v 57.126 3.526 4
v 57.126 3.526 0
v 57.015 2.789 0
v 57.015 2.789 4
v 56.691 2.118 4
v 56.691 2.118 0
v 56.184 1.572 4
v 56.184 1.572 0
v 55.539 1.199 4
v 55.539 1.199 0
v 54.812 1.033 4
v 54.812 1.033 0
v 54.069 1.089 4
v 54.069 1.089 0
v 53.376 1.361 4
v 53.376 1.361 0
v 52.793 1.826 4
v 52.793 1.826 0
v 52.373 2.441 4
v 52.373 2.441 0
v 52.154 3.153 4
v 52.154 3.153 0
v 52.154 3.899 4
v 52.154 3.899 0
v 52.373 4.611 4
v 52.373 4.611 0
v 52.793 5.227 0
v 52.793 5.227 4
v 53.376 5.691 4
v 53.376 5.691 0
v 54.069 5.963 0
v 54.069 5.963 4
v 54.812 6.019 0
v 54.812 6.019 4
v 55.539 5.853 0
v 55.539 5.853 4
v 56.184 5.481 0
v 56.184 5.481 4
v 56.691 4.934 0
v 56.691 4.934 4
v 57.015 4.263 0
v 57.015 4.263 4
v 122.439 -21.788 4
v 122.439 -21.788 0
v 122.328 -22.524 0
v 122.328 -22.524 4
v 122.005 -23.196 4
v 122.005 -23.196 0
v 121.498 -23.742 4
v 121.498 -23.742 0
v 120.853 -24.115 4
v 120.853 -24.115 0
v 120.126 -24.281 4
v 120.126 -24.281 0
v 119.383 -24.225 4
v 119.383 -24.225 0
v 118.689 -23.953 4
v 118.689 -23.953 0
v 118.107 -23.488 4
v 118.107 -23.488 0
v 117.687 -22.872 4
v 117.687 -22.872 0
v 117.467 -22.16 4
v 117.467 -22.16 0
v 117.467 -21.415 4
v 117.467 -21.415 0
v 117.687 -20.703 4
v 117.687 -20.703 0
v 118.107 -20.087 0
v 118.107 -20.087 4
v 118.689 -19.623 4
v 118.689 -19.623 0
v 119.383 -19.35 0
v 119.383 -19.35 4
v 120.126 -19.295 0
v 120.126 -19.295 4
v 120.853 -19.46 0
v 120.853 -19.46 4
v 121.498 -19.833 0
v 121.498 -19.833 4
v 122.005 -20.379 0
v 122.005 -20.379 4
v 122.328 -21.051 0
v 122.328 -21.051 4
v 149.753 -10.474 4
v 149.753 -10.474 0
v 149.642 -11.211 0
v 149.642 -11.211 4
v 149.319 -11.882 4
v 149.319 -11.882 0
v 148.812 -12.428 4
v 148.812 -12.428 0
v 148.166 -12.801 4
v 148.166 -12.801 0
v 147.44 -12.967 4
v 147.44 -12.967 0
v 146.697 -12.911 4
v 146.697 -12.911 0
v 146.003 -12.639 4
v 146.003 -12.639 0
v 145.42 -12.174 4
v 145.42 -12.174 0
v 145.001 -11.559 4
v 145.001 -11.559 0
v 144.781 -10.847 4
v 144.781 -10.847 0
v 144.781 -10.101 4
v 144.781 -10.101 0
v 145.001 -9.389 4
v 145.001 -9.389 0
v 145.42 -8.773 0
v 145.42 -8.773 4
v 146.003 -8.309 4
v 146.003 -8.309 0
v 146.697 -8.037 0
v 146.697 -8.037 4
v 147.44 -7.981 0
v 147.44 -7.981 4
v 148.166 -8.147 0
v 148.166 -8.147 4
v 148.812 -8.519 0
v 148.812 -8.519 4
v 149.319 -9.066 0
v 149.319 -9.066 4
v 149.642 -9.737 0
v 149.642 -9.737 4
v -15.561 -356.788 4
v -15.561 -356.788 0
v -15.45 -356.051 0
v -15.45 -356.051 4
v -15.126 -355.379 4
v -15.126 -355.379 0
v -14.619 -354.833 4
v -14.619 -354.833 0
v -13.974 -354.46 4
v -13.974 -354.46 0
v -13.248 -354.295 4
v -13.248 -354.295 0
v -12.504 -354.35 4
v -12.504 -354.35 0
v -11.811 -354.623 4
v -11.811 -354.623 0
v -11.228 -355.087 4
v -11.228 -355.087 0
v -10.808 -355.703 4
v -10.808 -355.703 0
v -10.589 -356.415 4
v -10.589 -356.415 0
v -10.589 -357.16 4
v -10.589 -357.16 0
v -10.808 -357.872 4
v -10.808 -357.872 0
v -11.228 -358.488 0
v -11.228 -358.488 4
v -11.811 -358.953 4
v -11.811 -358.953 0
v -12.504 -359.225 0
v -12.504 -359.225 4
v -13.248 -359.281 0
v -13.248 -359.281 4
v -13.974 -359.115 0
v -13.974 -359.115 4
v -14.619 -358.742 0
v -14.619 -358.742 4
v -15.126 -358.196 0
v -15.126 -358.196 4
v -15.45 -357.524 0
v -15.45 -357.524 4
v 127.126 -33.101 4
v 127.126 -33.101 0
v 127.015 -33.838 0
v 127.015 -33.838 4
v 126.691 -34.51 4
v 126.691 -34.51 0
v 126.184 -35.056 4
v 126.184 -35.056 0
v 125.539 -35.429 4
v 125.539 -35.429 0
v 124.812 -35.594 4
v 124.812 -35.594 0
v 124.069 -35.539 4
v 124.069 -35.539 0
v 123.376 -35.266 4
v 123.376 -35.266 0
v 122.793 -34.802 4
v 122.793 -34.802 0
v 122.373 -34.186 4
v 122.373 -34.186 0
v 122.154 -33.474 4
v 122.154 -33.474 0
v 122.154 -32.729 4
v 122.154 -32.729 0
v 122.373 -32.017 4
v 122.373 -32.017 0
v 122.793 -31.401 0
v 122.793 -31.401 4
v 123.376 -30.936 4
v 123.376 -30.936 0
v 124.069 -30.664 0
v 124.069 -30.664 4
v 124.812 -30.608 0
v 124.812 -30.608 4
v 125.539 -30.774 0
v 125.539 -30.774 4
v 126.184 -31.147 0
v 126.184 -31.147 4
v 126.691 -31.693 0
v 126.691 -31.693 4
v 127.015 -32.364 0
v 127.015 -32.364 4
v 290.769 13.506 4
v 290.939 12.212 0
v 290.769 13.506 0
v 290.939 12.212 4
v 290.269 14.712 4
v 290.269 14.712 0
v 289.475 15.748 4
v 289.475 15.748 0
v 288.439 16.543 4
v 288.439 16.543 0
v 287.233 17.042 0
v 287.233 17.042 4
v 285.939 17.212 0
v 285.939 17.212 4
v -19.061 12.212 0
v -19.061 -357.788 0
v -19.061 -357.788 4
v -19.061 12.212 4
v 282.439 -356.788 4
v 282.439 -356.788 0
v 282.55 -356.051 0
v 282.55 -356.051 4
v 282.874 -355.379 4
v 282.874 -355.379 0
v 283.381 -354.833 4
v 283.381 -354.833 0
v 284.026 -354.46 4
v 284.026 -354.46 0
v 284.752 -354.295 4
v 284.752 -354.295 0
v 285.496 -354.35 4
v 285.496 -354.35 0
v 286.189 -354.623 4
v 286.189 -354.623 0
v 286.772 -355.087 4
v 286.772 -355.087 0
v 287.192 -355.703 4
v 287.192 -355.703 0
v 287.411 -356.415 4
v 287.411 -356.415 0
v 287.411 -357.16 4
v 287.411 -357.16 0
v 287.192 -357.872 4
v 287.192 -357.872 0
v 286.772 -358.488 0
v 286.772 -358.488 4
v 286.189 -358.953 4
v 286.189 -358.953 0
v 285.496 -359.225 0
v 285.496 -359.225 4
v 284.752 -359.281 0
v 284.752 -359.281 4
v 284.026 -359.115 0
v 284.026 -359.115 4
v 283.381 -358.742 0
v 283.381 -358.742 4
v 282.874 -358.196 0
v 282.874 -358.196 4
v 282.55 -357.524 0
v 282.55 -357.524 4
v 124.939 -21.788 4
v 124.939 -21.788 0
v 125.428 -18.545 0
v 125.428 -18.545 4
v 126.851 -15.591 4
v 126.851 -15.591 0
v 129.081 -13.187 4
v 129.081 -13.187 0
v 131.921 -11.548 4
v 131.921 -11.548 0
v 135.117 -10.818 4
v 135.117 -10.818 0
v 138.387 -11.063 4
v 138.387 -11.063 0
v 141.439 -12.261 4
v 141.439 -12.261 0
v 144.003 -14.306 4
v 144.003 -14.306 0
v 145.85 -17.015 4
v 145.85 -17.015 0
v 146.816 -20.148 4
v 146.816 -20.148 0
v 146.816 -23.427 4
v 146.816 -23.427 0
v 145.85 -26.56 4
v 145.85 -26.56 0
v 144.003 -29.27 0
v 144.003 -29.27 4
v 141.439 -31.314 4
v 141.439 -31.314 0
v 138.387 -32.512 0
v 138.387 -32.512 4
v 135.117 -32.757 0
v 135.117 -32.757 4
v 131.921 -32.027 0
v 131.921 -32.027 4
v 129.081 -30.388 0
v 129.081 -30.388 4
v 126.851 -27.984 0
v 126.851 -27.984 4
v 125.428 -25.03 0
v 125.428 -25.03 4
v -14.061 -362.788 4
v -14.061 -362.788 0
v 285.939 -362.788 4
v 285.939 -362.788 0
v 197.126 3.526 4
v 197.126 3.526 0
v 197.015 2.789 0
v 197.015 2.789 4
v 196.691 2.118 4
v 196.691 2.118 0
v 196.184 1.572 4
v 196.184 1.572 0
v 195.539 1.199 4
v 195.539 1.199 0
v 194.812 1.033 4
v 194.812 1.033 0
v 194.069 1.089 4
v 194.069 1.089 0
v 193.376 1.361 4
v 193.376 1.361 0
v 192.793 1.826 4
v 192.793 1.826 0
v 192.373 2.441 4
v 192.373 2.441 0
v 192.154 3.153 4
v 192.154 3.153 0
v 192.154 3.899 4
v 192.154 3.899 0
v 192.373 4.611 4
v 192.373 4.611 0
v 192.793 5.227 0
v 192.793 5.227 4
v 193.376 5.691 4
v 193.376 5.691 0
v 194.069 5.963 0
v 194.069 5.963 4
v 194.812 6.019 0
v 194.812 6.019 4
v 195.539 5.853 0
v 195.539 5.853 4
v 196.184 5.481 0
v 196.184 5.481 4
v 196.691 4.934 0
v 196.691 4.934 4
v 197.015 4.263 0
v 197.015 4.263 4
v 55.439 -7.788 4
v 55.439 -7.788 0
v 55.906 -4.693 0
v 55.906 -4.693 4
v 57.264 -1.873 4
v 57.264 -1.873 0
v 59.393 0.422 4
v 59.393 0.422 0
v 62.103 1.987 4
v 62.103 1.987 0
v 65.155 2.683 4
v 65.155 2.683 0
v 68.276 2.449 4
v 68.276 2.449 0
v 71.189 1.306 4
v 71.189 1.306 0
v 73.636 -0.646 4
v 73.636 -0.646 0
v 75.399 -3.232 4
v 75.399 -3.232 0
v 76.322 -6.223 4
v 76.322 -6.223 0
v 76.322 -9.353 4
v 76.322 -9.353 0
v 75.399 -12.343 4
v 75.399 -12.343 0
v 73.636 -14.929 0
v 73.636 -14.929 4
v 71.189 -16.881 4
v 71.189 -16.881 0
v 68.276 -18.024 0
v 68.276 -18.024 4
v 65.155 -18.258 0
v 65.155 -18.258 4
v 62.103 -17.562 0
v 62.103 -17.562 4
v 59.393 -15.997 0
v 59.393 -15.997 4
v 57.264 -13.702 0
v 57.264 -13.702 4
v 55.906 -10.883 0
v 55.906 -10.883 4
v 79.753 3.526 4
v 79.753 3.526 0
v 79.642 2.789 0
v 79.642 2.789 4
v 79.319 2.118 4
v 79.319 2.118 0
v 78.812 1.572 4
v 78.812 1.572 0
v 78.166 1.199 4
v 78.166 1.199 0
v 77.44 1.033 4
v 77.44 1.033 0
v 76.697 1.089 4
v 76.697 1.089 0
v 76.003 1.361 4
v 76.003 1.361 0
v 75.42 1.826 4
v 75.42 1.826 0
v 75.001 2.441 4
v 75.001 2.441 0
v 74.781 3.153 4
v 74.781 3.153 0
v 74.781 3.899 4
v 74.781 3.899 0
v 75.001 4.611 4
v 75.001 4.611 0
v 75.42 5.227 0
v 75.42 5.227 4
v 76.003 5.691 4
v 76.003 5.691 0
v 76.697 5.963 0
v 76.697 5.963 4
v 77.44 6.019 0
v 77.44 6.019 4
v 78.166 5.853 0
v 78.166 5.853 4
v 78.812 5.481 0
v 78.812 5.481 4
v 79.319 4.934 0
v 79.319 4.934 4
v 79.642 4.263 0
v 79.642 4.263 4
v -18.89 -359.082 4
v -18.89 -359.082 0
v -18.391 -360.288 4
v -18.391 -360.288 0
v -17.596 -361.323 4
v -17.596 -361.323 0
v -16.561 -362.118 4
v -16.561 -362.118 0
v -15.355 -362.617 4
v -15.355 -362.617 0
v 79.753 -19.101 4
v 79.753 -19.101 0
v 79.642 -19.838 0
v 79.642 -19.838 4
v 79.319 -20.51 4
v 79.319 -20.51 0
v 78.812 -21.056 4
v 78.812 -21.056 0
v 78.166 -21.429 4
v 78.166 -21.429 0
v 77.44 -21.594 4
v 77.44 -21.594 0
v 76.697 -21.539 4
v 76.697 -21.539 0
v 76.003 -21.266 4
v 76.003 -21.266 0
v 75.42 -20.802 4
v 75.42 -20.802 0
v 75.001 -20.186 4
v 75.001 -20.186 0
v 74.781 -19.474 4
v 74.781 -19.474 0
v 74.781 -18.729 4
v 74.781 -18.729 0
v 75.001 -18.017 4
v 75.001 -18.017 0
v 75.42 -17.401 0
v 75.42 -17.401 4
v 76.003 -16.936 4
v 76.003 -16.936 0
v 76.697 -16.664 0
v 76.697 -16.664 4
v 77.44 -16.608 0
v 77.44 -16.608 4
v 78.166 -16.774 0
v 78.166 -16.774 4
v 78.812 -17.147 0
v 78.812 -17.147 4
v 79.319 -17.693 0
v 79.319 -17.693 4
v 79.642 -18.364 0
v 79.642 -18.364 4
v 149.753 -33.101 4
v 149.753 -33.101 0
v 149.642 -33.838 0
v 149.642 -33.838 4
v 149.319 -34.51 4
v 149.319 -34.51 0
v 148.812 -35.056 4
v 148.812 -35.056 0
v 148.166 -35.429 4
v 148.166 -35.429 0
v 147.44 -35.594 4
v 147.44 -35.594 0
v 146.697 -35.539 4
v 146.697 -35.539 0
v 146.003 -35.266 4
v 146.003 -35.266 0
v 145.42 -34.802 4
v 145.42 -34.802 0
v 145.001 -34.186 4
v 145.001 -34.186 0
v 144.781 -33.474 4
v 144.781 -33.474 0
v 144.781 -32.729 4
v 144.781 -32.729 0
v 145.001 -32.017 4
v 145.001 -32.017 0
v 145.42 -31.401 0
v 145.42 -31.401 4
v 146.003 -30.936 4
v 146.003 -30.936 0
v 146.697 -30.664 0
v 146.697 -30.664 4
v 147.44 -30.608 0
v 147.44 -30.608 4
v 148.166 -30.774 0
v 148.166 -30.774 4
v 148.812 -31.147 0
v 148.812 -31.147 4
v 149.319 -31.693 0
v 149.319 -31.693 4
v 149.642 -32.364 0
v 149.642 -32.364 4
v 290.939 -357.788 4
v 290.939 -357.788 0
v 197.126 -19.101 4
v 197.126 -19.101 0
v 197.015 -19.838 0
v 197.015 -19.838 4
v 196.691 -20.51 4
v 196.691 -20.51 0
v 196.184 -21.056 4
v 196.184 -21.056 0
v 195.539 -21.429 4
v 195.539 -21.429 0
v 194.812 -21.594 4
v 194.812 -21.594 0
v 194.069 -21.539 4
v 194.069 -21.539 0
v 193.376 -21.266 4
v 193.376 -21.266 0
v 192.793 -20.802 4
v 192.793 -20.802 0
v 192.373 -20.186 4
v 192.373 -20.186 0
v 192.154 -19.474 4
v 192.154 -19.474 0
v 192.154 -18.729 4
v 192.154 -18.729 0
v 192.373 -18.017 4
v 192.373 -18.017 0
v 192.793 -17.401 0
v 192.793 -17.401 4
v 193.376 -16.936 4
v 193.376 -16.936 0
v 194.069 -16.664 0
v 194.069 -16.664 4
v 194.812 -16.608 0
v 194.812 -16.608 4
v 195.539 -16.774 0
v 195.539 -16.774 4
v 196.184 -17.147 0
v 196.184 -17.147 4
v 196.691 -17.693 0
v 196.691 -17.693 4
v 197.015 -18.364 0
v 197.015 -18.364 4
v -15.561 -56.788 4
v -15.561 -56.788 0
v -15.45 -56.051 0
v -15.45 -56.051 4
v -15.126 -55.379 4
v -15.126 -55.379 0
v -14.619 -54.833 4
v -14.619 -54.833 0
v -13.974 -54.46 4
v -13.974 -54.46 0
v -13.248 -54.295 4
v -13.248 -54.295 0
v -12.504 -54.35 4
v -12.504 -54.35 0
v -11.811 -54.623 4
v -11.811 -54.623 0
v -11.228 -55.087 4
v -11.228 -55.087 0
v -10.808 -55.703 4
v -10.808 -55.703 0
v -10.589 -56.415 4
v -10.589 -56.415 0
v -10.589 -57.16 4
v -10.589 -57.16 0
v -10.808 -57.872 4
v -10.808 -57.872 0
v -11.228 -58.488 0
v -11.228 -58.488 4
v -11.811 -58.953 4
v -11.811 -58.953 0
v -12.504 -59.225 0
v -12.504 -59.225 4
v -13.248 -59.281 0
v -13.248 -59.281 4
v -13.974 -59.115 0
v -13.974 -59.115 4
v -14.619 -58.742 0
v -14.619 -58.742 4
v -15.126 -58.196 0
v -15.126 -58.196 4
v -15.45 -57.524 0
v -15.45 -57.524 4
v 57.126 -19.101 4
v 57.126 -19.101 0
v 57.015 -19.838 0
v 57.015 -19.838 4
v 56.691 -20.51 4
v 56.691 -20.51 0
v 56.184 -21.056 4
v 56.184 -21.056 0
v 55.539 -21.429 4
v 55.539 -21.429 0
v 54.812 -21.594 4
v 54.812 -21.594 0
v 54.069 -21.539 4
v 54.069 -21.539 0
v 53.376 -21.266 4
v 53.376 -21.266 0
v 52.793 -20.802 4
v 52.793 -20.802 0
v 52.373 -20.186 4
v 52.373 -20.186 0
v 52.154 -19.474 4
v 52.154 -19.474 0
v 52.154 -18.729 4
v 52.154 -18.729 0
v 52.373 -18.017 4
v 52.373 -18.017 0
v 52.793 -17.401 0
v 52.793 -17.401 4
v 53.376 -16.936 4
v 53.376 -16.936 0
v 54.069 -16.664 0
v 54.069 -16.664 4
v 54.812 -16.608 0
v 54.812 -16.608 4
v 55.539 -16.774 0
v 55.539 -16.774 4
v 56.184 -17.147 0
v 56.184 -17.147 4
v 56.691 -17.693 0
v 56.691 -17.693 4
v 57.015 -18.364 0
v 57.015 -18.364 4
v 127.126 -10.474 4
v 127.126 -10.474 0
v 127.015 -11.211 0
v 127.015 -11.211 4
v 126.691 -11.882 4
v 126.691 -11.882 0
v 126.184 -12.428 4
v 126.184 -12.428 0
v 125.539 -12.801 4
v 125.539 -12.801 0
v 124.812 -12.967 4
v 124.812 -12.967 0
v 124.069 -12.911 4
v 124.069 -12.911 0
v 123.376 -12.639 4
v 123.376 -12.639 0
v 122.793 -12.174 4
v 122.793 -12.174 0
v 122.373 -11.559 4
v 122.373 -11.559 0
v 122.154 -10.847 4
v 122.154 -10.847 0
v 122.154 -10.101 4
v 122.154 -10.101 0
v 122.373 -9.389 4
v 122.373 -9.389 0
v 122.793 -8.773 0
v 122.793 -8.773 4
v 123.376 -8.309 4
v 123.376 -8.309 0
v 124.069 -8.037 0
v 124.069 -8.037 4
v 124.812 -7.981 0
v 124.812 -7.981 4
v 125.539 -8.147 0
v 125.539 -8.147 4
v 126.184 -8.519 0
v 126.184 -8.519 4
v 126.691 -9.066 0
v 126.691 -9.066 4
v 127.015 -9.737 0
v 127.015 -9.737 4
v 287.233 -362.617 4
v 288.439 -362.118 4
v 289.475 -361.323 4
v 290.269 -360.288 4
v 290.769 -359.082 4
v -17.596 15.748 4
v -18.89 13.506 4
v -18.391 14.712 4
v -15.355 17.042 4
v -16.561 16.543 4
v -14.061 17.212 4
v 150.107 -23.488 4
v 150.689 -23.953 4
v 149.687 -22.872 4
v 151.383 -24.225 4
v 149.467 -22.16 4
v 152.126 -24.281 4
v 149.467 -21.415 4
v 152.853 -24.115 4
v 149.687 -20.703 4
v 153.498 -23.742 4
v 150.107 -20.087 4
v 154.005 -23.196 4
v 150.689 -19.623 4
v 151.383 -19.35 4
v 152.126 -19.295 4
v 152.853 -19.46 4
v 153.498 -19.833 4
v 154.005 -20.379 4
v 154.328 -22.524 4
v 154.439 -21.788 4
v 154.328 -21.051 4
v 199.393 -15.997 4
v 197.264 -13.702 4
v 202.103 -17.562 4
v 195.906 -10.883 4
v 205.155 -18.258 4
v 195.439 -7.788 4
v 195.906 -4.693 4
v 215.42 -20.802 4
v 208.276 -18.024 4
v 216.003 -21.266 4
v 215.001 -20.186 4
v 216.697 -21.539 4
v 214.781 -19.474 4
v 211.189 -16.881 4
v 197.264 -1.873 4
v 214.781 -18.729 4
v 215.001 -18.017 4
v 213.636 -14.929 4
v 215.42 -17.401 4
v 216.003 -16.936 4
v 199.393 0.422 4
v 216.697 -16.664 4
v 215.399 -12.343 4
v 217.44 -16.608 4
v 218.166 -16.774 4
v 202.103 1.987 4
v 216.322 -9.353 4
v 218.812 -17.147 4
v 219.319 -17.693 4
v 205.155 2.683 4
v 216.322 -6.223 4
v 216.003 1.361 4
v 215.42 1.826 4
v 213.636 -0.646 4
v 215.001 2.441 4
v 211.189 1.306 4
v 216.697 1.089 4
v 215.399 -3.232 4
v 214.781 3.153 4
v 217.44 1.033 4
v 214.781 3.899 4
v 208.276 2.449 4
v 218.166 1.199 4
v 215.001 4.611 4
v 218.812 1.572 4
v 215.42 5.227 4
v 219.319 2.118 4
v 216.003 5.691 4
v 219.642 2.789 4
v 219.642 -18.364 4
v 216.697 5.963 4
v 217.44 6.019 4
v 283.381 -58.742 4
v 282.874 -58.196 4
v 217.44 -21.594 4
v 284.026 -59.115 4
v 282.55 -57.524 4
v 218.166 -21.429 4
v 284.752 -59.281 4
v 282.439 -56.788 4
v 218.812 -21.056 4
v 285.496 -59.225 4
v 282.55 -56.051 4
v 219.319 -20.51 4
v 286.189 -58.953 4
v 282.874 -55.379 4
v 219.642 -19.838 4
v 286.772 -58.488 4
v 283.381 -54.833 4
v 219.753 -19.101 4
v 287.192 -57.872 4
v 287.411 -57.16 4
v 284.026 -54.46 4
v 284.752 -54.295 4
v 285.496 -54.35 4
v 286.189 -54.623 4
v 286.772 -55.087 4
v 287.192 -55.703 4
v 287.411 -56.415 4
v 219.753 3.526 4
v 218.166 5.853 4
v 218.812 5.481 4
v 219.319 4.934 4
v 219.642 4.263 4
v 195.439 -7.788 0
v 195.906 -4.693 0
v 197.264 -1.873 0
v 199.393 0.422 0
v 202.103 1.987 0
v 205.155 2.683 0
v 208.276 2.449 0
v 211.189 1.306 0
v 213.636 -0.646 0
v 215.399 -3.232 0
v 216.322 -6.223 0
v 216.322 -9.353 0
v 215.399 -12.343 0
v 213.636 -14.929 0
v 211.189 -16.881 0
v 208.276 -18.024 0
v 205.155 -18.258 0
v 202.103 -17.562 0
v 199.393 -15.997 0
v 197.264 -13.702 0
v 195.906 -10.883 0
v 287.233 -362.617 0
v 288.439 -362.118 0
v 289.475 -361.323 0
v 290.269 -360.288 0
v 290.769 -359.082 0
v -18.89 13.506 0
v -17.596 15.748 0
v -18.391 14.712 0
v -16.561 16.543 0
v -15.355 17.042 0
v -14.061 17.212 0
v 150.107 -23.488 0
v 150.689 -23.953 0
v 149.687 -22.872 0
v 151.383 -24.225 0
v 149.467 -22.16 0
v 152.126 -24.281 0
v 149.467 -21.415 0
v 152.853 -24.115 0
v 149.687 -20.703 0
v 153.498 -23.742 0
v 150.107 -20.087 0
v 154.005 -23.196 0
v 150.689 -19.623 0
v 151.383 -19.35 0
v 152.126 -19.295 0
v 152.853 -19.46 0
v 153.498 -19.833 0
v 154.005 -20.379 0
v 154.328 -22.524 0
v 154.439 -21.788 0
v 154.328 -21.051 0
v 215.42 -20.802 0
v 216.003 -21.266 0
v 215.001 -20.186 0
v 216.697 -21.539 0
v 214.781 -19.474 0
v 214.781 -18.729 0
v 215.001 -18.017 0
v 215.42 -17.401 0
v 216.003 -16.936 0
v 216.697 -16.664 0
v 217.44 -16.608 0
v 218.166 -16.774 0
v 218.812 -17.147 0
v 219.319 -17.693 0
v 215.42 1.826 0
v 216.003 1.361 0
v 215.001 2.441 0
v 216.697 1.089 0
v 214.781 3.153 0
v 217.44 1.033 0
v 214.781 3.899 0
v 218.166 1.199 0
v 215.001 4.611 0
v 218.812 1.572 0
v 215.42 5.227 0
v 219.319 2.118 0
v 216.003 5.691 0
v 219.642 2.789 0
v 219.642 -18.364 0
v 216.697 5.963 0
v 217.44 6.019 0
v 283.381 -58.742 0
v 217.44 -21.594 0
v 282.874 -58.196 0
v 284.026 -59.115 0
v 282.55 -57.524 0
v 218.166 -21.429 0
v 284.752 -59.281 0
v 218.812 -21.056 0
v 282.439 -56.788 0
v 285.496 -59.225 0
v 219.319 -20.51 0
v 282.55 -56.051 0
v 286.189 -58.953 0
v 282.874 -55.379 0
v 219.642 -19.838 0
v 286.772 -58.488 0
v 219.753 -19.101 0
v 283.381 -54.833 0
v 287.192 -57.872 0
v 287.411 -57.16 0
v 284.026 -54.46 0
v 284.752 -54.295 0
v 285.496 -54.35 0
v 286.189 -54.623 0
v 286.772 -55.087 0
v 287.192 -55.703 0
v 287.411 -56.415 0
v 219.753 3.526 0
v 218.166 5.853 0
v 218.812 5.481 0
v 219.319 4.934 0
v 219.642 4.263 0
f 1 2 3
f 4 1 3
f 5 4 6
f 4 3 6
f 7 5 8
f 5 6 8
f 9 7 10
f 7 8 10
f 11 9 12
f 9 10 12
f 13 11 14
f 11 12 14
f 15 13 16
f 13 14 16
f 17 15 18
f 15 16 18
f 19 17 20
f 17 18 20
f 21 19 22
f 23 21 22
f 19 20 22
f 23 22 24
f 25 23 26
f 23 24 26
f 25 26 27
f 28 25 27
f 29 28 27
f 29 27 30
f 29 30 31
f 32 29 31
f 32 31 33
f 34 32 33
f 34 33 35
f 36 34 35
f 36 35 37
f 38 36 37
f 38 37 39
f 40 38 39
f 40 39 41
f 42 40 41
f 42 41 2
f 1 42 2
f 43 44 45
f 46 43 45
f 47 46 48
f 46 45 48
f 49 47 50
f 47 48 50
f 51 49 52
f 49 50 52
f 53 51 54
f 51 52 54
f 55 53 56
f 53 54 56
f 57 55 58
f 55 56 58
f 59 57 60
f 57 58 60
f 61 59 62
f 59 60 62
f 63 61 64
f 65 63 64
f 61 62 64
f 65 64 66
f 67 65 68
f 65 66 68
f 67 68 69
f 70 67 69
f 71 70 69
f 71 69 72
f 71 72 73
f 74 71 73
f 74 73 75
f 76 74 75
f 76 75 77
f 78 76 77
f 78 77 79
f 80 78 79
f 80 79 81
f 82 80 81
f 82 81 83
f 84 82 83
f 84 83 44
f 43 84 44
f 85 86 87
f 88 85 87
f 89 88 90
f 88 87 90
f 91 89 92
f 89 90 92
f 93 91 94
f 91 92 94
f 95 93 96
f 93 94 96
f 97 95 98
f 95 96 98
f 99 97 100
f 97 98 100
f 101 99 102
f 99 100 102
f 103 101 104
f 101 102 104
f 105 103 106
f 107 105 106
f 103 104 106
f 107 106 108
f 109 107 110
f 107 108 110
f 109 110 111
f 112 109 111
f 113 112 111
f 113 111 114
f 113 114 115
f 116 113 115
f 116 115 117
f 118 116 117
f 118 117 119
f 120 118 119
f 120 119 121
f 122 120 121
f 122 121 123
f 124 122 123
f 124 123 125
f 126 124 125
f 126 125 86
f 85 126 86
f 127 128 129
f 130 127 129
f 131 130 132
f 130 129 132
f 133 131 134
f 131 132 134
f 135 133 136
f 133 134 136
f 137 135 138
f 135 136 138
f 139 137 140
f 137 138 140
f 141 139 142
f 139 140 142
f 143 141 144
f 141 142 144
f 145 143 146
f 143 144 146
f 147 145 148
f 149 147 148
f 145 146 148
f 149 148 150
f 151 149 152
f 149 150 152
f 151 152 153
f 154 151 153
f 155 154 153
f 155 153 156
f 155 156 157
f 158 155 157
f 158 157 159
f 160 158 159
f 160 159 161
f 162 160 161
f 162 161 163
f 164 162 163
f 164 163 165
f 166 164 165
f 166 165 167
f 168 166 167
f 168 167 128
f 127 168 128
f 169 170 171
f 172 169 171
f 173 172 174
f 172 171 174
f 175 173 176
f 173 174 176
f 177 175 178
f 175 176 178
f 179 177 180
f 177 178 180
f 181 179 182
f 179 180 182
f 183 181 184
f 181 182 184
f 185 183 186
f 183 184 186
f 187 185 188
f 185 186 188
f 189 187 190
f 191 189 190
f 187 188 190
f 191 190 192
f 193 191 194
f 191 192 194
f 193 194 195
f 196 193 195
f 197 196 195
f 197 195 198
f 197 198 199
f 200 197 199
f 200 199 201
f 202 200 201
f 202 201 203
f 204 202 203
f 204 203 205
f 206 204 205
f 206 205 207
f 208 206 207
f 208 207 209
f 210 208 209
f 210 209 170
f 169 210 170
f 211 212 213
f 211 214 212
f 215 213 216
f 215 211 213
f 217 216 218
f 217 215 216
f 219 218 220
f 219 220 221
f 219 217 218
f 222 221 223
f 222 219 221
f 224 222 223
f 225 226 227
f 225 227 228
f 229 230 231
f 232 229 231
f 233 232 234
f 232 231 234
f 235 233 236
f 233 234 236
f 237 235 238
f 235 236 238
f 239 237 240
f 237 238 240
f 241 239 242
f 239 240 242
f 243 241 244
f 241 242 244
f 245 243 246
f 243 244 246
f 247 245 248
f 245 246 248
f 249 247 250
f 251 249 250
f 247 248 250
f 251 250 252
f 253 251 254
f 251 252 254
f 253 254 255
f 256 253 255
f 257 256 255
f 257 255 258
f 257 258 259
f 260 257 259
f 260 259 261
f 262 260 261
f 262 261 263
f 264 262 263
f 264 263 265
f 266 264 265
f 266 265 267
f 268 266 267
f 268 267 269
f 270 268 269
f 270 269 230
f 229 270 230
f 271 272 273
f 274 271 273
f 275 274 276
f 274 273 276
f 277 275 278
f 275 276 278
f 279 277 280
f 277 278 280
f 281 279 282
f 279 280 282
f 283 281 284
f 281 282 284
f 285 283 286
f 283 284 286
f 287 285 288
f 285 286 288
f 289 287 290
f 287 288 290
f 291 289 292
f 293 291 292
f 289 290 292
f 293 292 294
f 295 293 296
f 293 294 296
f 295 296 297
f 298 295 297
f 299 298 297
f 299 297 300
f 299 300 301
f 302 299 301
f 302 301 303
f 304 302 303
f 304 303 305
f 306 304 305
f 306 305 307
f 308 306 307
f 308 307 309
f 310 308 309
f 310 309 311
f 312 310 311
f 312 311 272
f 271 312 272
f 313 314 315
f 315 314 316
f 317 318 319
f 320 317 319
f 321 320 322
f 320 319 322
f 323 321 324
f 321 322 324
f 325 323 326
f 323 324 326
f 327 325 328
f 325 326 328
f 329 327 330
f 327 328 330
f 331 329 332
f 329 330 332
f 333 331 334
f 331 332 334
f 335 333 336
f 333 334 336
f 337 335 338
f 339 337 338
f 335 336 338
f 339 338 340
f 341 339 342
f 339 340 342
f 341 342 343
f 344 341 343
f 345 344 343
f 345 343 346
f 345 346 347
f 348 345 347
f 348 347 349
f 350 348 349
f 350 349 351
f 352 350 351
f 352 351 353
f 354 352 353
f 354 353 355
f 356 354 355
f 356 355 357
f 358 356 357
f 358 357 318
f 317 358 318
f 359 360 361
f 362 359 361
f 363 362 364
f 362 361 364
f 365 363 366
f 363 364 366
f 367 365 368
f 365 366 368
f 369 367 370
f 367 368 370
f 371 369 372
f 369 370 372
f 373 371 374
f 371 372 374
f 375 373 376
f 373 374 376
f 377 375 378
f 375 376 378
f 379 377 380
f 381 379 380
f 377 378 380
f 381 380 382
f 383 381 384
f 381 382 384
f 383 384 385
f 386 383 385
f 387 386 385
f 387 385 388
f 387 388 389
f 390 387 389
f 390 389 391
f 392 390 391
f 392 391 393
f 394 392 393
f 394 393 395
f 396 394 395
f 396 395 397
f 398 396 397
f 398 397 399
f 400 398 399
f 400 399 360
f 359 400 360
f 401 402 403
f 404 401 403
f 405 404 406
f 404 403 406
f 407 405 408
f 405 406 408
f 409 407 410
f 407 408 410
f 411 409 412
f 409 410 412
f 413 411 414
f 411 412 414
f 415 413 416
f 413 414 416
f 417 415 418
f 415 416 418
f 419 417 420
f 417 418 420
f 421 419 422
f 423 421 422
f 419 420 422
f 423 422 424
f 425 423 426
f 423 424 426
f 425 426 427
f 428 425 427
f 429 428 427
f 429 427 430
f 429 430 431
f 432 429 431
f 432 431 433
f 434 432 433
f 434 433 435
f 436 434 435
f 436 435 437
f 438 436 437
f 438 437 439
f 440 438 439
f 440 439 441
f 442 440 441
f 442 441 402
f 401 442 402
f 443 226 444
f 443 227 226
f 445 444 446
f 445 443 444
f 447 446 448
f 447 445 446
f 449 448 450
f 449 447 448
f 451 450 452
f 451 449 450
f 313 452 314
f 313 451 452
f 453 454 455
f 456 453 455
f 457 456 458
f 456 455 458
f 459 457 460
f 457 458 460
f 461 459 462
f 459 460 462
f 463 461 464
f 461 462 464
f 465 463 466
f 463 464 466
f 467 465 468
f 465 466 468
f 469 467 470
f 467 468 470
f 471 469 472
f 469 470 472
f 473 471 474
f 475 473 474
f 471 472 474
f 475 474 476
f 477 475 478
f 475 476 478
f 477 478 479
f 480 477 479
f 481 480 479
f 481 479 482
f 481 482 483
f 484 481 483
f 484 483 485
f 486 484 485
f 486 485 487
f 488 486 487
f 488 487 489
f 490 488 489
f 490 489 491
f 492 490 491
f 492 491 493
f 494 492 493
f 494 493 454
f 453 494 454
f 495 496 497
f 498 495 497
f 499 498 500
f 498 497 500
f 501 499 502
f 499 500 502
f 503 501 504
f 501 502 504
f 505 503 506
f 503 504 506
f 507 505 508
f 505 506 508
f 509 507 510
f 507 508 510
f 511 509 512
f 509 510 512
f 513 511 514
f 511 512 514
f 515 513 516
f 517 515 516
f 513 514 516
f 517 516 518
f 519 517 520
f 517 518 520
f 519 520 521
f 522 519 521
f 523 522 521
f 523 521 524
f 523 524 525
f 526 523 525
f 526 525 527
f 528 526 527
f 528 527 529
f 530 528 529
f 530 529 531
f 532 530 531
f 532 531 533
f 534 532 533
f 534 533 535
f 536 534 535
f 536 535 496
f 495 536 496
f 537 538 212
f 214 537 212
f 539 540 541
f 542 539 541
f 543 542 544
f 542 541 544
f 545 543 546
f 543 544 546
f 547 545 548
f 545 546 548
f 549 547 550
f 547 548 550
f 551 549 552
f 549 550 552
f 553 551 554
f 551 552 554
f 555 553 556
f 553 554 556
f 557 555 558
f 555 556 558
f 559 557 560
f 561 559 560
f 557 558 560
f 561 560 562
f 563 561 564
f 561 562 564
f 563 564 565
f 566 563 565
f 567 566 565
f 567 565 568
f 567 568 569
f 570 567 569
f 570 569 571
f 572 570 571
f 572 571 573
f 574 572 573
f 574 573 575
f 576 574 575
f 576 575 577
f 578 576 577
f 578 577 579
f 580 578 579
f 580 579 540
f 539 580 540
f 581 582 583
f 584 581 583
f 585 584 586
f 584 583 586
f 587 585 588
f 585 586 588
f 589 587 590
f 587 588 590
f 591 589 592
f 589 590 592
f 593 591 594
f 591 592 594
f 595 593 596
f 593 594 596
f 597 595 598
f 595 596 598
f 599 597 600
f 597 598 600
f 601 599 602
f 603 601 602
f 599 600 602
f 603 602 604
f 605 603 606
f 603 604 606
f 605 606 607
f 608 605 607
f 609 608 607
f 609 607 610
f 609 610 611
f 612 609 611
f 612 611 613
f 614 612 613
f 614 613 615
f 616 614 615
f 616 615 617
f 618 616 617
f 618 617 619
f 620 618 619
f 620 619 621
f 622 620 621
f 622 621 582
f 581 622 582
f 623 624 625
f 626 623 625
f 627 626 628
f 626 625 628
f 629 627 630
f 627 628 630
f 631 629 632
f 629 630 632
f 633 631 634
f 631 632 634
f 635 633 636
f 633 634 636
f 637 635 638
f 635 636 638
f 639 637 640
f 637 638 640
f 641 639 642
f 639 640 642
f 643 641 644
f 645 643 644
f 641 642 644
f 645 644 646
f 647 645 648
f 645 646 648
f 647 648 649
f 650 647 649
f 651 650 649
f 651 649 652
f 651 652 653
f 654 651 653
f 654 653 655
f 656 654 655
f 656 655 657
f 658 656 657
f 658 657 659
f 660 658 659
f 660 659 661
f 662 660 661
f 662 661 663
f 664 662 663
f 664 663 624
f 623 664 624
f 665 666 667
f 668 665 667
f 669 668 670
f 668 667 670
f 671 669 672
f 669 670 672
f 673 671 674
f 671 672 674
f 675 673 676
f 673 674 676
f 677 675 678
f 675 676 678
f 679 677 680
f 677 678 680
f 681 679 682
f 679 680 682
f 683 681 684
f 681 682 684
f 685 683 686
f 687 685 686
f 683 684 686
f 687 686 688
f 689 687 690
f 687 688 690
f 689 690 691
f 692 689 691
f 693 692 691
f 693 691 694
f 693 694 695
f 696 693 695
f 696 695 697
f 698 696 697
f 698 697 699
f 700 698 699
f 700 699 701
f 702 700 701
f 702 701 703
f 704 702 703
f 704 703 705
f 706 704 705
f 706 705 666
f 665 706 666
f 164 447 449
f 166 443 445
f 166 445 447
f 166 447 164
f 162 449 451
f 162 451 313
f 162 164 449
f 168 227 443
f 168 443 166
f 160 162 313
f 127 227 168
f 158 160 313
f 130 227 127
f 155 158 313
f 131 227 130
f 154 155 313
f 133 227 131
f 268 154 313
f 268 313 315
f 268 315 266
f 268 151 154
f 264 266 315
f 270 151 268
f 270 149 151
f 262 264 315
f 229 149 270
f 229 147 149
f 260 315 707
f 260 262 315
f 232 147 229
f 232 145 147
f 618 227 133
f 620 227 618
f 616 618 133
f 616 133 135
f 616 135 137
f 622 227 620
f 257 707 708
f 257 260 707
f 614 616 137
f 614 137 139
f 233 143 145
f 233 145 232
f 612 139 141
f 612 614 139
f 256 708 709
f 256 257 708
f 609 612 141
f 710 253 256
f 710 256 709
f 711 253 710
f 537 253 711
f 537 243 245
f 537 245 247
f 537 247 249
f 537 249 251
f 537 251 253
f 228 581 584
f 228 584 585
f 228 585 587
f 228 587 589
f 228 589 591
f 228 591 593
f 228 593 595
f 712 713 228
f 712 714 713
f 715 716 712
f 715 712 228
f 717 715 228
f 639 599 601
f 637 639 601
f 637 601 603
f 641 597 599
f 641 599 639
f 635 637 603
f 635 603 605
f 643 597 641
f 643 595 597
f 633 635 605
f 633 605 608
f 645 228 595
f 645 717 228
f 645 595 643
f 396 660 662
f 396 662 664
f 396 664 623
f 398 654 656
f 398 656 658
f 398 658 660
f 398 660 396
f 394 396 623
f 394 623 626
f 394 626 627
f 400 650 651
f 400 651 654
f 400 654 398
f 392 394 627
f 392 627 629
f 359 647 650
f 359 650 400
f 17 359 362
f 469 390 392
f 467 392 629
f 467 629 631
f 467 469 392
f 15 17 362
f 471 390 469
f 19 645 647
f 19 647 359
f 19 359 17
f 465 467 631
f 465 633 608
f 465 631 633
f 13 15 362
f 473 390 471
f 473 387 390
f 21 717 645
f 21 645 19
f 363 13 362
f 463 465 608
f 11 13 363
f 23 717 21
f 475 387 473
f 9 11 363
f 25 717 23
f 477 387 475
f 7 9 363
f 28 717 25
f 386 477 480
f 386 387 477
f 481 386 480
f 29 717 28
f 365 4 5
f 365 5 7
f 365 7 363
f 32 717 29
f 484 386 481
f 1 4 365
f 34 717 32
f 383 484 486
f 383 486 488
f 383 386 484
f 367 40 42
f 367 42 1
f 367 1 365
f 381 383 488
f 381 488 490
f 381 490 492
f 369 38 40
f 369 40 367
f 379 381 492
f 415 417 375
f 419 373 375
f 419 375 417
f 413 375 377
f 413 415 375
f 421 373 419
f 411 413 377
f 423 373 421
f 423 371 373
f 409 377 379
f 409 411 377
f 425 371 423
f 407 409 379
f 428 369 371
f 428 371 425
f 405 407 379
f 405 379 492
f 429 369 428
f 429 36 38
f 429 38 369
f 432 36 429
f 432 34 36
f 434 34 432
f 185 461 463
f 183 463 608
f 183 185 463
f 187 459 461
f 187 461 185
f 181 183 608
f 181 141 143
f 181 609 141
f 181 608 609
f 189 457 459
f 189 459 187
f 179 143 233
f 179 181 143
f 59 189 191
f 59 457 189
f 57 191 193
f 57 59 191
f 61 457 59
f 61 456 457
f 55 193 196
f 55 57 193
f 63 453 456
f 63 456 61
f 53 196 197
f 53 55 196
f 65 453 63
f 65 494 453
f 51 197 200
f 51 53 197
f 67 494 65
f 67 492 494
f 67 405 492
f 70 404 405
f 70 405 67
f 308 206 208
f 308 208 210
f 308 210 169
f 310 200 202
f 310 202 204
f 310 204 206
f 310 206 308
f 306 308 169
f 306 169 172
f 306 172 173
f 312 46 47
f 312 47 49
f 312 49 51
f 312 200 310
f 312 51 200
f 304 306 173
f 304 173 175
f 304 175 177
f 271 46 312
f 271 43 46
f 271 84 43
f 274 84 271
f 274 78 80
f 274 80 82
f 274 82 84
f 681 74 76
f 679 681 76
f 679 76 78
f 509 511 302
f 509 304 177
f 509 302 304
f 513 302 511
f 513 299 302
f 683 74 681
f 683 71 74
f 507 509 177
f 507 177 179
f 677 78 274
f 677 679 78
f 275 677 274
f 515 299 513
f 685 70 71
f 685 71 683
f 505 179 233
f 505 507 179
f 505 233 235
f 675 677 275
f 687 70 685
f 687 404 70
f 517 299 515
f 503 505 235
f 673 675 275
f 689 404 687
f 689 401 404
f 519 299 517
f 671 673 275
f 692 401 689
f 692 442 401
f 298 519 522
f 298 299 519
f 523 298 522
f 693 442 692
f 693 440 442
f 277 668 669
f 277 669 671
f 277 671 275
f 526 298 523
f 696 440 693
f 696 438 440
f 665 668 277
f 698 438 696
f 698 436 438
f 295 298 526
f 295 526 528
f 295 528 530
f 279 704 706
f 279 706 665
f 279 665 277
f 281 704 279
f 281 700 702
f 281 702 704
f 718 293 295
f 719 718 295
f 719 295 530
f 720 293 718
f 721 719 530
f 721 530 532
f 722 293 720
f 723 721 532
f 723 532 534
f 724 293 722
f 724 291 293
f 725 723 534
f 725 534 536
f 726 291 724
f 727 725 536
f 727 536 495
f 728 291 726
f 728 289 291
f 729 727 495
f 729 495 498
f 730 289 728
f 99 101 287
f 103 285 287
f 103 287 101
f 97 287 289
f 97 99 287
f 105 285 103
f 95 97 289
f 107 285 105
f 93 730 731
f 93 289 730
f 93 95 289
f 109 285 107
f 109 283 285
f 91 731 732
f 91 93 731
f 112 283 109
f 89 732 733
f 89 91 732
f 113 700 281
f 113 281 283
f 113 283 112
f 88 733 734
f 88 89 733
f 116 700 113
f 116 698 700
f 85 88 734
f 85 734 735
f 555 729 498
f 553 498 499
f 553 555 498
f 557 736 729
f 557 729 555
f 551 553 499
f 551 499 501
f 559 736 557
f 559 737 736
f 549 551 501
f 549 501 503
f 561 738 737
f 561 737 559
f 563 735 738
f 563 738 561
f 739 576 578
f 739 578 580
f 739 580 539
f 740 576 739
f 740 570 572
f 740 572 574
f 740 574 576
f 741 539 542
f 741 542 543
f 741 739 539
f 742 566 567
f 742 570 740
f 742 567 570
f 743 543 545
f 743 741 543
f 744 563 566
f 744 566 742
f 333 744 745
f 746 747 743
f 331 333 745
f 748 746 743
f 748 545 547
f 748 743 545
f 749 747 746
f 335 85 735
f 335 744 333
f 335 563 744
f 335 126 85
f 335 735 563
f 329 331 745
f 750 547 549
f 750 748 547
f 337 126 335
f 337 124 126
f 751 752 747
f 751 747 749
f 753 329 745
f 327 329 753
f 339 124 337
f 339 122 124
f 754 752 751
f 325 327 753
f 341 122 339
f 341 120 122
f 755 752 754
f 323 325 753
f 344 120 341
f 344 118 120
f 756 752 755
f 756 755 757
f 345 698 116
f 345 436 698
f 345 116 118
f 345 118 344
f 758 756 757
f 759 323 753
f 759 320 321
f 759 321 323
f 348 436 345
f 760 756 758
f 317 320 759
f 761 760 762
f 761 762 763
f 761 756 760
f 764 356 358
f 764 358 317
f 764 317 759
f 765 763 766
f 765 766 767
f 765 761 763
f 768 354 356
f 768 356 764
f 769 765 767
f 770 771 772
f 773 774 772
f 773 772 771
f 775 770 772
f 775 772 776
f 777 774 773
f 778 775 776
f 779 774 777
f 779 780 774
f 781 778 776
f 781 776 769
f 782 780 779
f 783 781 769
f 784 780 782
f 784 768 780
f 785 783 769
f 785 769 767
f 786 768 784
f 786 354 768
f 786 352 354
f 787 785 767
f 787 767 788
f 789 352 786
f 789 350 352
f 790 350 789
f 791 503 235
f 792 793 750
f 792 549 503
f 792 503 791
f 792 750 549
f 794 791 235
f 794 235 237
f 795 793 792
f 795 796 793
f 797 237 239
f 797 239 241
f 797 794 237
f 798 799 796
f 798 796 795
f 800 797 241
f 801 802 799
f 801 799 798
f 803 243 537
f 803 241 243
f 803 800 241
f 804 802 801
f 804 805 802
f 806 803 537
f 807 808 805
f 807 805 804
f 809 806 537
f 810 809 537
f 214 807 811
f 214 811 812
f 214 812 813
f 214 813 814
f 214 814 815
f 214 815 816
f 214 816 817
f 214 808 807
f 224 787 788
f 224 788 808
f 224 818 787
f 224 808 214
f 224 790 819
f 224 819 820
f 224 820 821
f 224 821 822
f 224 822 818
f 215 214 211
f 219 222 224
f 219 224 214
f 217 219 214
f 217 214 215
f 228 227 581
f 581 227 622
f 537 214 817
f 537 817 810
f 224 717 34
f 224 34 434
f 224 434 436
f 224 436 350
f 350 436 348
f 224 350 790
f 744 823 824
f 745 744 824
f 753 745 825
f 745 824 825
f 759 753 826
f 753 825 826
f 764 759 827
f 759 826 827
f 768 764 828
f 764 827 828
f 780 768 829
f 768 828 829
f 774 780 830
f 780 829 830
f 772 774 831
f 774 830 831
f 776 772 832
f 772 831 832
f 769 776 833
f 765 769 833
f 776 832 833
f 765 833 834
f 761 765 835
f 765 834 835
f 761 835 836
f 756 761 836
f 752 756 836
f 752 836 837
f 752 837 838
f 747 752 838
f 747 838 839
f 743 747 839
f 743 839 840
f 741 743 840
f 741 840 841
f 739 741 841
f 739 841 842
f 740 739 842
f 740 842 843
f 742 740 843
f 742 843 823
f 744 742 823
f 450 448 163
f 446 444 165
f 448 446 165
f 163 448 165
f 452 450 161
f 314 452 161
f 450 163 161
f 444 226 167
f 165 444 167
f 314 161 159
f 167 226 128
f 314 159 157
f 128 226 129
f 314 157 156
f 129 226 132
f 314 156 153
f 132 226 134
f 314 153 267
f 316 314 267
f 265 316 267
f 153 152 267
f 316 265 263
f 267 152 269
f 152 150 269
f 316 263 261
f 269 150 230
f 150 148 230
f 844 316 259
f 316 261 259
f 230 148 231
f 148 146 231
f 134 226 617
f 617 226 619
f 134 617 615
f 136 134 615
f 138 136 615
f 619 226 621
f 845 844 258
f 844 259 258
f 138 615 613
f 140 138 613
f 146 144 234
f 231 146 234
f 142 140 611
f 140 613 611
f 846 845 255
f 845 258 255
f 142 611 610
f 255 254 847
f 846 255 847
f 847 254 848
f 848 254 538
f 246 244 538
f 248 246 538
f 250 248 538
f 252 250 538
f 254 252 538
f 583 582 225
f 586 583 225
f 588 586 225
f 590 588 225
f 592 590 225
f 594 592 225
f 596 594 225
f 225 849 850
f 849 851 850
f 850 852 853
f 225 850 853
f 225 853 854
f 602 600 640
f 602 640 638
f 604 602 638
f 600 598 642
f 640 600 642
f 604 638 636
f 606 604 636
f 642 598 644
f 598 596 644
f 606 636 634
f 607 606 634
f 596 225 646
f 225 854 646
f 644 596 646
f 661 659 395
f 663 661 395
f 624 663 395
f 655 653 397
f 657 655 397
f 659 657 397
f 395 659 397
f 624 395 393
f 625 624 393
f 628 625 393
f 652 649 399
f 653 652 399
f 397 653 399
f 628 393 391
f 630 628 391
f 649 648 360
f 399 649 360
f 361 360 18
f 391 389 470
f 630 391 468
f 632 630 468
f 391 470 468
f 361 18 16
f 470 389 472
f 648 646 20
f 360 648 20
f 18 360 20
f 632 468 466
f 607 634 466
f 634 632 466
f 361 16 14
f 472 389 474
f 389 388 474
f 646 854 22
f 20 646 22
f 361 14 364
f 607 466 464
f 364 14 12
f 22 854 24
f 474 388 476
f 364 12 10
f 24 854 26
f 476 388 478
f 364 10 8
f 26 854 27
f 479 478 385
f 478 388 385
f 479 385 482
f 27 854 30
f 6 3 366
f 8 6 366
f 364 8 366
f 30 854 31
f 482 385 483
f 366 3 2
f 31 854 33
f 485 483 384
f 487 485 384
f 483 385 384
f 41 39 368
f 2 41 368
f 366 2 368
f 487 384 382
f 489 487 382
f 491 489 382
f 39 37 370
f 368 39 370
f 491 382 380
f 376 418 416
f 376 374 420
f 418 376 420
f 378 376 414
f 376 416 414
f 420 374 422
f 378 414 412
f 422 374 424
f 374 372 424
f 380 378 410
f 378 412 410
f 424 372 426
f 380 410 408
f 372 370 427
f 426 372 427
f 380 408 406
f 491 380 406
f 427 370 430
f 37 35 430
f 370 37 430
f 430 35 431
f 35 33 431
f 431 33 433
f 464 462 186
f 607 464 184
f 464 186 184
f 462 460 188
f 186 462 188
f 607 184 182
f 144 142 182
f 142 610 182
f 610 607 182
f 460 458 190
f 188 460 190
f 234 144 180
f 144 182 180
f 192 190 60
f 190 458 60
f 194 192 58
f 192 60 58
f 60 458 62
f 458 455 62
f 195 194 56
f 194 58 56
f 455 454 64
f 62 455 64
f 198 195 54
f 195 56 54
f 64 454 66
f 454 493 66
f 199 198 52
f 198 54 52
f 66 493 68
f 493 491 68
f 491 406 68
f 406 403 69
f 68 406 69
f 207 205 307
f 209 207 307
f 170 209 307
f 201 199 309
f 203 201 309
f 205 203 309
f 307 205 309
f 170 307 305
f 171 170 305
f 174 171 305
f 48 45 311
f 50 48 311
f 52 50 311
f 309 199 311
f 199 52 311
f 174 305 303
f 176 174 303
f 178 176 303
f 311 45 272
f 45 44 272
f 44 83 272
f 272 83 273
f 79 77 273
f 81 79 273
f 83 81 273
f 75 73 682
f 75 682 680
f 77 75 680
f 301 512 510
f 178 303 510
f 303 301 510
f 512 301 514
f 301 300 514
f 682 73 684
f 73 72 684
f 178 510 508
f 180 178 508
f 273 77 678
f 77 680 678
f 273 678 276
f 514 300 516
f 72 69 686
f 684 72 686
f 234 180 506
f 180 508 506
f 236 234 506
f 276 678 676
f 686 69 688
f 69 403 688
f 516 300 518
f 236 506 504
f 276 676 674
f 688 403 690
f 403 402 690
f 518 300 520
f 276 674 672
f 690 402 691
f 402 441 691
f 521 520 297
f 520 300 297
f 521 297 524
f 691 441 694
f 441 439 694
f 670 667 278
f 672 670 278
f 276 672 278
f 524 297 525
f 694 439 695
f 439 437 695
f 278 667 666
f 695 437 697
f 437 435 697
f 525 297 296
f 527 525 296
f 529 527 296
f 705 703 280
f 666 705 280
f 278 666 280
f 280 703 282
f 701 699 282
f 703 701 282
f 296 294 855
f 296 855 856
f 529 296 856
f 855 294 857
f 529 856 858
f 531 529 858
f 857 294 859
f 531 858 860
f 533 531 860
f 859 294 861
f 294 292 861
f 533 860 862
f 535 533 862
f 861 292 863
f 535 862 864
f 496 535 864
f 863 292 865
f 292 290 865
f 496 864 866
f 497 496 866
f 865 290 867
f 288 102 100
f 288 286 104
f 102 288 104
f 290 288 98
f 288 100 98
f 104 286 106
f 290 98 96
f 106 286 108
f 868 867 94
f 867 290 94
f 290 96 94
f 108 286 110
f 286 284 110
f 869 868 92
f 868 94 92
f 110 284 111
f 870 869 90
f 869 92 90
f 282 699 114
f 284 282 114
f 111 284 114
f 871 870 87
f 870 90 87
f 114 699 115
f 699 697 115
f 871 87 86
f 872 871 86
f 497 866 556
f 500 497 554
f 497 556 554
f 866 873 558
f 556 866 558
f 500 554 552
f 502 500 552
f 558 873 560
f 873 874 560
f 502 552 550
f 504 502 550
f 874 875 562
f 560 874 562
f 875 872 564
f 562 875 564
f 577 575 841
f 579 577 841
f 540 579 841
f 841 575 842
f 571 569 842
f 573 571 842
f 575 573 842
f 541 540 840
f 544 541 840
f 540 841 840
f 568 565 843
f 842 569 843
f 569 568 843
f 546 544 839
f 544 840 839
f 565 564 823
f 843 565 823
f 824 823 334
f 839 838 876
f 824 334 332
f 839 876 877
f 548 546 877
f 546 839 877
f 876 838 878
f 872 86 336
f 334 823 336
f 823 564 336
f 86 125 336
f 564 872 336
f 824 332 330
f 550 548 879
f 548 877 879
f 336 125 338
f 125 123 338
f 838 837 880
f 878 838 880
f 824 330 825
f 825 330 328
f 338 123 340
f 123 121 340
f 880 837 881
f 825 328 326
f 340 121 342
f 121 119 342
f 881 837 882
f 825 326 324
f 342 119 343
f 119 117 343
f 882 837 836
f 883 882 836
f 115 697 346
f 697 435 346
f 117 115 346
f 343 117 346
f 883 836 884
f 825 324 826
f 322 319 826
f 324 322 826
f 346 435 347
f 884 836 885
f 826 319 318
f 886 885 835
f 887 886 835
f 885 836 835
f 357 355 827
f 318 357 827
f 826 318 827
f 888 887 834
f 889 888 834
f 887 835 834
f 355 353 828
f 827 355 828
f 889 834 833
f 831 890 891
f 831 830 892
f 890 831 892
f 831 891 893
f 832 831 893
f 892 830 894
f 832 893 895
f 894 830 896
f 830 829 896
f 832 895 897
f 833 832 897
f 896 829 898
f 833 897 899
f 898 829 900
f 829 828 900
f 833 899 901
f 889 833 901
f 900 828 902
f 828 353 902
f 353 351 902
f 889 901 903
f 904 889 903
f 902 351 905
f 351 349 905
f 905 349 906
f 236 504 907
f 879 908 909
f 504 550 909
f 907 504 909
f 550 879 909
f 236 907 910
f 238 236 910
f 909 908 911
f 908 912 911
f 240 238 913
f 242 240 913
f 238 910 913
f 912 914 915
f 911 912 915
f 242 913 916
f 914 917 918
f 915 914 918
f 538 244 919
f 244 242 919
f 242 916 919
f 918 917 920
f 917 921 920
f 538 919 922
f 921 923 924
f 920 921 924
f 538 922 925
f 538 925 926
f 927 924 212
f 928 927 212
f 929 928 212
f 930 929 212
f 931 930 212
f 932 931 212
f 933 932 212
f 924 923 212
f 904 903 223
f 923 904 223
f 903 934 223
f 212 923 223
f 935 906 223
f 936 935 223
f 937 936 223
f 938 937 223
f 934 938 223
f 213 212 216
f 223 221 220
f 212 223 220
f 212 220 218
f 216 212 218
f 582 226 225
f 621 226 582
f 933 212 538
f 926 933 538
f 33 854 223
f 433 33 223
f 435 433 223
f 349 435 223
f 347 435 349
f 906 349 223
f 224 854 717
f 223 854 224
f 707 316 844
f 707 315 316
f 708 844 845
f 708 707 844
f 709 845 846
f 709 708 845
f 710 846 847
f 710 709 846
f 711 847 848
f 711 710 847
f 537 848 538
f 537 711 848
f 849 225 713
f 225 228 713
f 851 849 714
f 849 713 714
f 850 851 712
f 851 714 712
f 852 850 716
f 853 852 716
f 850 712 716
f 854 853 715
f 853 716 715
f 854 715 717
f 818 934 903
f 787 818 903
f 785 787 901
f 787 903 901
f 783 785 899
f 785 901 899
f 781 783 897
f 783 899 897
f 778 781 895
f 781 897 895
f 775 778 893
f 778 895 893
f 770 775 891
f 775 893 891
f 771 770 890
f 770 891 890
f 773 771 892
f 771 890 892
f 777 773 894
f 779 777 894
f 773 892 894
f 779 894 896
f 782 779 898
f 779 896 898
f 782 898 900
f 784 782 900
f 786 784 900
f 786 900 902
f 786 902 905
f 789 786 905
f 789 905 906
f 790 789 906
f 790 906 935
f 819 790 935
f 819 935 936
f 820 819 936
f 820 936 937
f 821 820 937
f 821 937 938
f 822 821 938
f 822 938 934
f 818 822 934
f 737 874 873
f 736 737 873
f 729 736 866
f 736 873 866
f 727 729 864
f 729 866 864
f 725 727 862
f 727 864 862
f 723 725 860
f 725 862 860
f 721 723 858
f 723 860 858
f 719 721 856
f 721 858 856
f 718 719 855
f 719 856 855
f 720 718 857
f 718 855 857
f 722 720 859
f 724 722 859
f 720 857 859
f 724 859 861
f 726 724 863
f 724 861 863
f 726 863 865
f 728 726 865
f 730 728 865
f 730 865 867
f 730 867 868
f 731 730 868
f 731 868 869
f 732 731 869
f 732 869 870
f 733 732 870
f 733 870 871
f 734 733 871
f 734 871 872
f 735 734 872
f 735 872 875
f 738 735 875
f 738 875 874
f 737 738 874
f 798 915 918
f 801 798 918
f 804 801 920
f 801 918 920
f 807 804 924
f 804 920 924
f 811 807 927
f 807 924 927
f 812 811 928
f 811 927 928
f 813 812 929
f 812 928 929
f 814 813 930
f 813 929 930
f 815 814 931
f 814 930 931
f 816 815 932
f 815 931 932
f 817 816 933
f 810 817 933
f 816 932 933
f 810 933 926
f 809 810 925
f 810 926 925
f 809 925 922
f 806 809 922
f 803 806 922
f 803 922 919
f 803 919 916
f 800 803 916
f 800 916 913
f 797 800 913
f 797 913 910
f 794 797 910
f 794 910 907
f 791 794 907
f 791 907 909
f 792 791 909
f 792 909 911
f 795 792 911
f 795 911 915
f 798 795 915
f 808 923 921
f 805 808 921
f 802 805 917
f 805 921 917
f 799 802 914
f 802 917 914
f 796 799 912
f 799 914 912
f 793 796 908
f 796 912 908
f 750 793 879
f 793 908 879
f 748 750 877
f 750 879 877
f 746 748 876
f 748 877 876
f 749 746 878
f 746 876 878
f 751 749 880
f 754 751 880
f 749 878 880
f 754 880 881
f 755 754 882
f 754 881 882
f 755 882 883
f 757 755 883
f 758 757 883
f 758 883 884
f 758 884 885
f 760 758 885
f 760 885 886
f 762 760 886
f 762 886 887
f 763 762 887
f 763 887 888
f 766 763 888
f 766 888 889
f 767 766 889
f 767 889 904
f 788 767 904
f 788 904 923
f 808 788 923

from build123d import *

# Parameters (mm, degrees)
ESQUISSE1_W             = 310
ESQUISSE1_H             = 380
BOSS_EXTRU_1_DEPTH      = 4
CONG_1_R                = 5
ESQUISSE3_R             = 10.5
ESQUISSE3_R_2           = 11
ESQUISSE3_R_3           = 2.5
ENL_V_MAT_EXTRU_1_DEPTH = 10


with BuildPart() as part:
    # Esquisse1 → Boss.-Extru.1 (new body)
    with BuildSketch(Plane.XY):
        with Locations((135.939300038, -172.787610619)):
            Rectangle(ESQUISSE1_W, ESQUISSE1_H)
    extrude(amount=BOSS_EXTRU_1_DEPTH)

    # Congé1
    cong_1_edges = [part.edges().sort_by_distance(p)[0] for p in [
        (-19.060699962, 17.212389381, 2),
        (290.939300038, 17.212389381, 2),
        (290.939300038, -362.787610619, 2),
        (-19.060699962, -362.787610619, 2),
    ]]
    fillet(cong_1_edges, radius=CONG_1_R)

    # Esquisse3 → Enlèv. mat.-Extru.1 (cut)
    with BuildSketch(Plane(origin=(0, 0, 0), x_dir=(-1, 0, 0), z_dir=(0, 0, -1))):
        with Locations((-205.939300038, -7.787610619)):
            Circle(ESQUISSE3_R)
        with Locations((-135.939300038, -21.787610619)):
            Circle(ESQUISSE3_R_2)
        with Locations((-65.939300038, -7.787610619)):
            Circle(ESQUISSE3_R)
        with Locations(Location((-217.253008537, 3.52609788, 0), (0, 0, 180))):
            Circle(ESQUISSE3_R_3)
        with Locations(Location((-194.625591539, 3.52609788, 0), (0, 0, 180))):
            Circle(ESQUISSE3_R_3)
        with Locations(Location((-194.625591539, -19.101319118, 0), (0, 0, 180))):
            Circle(ESQUISSE3_R_3)
        with Locations(Location((-217.253008537, -19.101319118, 0), (0, 0, 180))):
            Circle(ESQUISSE3_R_3)
        with Locations(Location((-77.253008537, 3.52609788, 0), (0, 0, 180))):
            Circle(ESQUISSE3_R_3)
        with Locations(Location((-54.625591539, 3.52609788, 0), (0, 0, 180))):
            Circle(ESQUISSE3_R_3)
        with Locations(Location((-54.625591539, -19.101319118, 0), (0, 0, 180))):
            Circle(ESQUISSE3_R_3)
        with Locations(Location((-77.253008537, -19.101319118, 0), (0, 0, 180))):
            Circle(ESQUISSE3_R_3)
        with Locations(Location((-119.939300038, -21.787610619, 0), (0, 0, 180))):
            Circle(ESQUISSE3_R_3)
        with Locations(Location((-124.625591539, -10.47390212, 0), (0, 0, 180))):
            Circle(ESQUISSE3_R_3)
        with Locations(Location((-124.625591539, -33.101319118, 0), (0, 0, 180))):
            Circle(ESQUISSE3_R_3)
        with Locations(Location((-147.253008537, -33.101319118, 0), (0, 0, 180))):
            Circle(ESQUISSE3_R_3)
        with Locations(Location((-151.939300038, -21.787610619, 0), (0, 0, 180))):
            Circle(ESQUISSE3_R_3)
        with Locations(Location((-147.253008537, -10.47390212, 0), (0, 0, 180))):
            Circle(ESQUISSE3_R_3)
        with Locations((13.060699962, -56.787610619)):
            Circle(ESQUISSE3_R_3)
        with Locations((13.060699962, -356.787610619)):
            Circle(ESQUISSE3_R_3)
        with Locations((-284.939300038, -356.787610619)):
            Circle(ESQUISSE3_R_3)
        with Locations((-284.939300038, -56.787610619)):
            Circle(ESQUISSE3_R_3)
    extrude(amount=-ENL_V_MAT_EXTRU_1_DEPTH, mode=Mode.SUBTRACT)


solid = part.part
